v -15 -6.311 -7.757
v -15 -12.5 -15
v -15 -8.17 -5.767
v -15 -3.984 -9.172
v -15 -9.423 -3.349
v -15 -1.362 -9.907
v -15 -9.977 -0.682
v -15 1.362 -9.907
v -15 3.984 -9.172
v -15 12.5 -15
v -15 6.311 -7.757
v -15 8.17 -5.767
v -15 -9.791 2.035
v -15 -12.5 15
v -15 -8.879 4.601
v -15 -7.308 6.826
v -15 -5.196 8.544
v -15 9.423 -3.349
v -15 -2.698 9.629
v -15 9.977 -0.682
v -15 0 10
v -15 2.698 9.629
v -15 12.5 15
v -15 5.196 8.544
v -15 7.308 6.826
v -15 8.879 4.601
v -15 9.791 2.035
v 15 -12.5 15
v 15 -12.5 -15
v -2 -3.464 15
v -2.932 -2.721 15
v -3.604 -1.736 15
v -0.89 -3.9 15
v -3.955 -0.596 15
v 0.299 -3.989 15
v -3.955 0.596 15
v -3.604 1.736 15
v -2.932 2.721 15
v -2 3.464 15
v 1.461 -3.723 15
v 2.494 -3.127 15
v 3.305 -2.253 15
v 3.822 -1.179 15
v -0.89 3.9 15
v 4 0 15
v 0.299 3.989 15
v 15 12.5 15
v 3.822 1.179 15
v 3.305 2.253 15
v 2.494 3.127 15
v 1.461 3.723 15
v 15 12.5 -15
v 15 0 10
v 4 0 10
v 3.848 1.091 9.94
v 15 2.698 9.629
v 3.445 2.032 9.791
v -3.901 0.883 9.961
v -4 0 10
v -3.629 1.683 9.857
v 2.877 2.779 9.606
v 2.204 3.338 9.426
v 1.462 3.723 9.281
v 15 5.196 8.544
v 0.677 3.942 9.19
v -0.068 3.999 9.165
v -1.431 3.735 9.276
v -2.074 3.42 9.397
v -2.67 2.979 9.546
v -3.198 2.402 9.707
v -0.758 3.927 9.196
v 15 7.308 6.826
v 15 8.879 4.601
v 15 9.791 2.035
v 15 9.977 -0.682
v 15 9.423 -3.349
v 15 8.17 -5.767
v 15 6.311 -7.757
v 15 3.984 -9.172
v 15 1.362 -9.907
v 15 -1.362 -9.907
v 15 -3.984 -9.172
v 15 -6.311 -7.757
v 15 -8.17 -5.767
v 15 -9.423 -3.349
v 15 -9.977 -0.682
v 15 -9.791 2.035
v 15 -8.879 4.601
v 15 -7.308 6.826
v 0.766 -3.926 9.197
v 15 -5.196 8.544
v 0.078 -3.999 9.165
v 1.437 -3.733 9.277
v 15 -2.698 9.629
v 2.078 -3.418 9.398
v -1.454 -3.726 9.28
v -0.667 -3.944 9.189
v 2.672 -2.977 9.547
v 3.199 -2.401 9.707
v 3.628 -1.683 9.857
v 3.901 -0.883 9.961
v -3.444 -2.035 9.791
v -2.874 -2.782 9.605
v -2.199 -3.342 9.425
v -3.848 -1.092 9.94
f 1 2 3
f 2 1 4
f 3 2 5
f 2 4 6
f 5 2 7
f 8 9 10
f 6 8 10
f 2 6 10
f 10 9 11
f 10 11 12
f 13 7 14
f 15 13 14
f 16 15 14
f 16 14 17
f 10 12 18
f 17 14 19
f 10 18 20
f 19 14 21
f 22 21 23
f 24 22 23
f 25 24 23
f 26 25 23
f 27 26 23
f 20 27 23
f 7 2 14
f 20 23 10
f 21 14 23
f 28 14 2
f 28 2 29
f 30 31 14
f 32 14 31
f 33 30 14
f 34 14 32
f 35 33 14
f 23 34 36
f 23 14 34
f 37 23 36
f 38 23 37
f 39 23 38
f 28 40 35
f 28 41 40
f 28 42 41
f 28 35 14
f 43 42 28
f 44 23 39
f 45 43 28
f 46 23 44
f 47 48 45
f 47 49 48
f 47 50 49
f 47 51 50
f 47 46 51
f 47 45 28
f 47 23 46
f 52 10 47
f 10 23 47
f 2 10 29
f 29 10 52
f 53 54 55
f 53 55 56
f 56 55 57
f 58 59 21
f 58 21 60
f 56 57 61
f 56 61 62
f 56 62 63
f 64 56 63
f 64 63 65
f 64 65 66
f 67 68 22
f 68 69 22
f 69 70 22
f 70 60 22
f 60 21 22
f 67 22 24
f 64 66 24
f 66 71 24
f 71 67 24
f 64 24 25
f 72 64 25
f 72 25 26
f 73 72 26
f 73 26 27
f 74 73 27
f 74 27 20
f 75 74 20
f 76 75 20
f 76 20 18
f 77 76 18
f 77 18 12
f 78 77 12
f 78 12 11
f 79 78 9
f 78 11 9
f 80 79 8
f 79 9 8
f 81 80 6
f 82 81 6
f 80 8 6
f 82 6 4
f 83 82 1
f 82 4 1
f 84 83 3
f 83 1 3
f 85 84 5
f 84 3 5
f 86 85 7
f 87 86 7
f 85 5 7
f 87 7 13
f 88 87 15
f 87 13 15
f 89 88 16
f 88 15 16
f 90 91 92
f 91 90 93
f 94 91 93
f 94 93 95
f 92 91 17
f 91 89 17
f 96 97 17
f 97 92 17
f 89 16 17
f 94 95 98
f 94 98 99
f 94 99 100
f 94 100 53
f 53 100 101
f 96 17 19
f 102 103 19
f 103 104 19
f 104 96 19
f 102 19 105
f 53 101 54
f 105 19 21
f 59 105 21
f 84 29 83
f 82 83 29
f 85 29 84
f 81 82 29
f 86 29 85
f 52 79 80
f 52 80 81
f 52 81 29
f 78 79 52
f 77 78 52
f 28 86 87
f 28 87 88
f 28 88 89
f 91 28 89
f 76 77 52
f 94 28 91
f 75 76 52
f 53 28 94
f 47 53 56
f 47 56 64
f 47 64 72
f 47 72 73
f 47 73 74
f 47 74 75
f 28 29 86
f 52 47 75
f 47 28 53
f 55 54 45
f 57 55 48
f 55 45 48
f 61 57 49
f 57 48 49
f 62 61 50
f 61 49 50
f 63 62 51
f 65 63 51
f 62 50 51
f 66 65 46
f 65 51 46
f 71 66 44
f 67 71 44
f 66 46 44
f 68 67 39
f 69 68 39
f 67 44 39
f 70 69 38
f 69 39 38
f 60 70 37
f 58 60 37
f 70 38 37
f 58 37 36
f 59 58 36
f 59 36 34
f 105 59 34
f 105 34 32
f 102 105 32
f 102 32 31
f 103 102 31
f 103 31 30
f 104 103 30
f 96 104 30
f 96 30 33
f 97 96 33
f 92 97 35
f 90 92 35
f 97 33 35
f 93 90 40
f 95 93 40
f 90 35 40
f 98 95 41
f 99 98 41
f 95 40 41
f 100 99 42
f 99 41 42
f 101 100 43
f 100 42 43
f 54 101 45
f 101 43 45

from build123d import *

# Parameters (mm, degrees)
SKETCH_1_W               = 30
SKETCH_1_H               = 25
EXTRUDE_1_DEPTH          = 15
SKETCH_3_R               = 10
CUT_EXTRUDE_1_DEPTH      = 36.794552658
CUT_EXTRUDE_2_REACH      = 37.795
CUT_EXTRUDE_2_END_RADIUS = 10
SKETCH_4_R               = 4


with BuildPart() as part:
    # 草图1 → 凸台-拉伸1 (new, symmetric)
    with BuildSketch(Plane.XY):
        Rectangle(SKETCH_1_W, SKETCH_1_H)
    extrude(amount=EXTRUDE_1_DEPTH, both=True)

    # 草图3 → 切除-拉伸1 (cut, through all)
    with BuildSketch(Plane.ZY.offset(15)):
        Circle(SKETCH_3_R)
    extrude(amount=-CUT_EXTRUDE_1_DEPTH, mode=Mode.SUBTRACT)

    # 切除-拉伸2: up to this cylinder (the profile starts outside it)
    cut_extrude_2_end = Plane(origin=(0, 0, 0), z_dir=(-1, 0, 0)) * Cylinder(CUT_EXTRUDE_2_END_RADIUS, 96.59, mode=Mode.PRIVATE)
    # 草图4 → 切除-拉伸2 (cut, up to the surface)
    with BuildSketch(Plane.XY.offset(15), mode=Mode.PRIVATE) as cut_extrude_2_sk1:
        Circle(SKETCH_4_R)
    cut_extrude_2_tool1 = extrude(cut_extrude_2_sk1.sketch, amount=-CUT_EXTRUDE_2_REACH, mode=Mode.PRIVATE) - cut_extrude_2_end
    add(cut_extrude_2_tool1.solids().sort_by_distance((0, 0, 15))[0], mode=Mode.SUBTRACT)


solid = part.part
